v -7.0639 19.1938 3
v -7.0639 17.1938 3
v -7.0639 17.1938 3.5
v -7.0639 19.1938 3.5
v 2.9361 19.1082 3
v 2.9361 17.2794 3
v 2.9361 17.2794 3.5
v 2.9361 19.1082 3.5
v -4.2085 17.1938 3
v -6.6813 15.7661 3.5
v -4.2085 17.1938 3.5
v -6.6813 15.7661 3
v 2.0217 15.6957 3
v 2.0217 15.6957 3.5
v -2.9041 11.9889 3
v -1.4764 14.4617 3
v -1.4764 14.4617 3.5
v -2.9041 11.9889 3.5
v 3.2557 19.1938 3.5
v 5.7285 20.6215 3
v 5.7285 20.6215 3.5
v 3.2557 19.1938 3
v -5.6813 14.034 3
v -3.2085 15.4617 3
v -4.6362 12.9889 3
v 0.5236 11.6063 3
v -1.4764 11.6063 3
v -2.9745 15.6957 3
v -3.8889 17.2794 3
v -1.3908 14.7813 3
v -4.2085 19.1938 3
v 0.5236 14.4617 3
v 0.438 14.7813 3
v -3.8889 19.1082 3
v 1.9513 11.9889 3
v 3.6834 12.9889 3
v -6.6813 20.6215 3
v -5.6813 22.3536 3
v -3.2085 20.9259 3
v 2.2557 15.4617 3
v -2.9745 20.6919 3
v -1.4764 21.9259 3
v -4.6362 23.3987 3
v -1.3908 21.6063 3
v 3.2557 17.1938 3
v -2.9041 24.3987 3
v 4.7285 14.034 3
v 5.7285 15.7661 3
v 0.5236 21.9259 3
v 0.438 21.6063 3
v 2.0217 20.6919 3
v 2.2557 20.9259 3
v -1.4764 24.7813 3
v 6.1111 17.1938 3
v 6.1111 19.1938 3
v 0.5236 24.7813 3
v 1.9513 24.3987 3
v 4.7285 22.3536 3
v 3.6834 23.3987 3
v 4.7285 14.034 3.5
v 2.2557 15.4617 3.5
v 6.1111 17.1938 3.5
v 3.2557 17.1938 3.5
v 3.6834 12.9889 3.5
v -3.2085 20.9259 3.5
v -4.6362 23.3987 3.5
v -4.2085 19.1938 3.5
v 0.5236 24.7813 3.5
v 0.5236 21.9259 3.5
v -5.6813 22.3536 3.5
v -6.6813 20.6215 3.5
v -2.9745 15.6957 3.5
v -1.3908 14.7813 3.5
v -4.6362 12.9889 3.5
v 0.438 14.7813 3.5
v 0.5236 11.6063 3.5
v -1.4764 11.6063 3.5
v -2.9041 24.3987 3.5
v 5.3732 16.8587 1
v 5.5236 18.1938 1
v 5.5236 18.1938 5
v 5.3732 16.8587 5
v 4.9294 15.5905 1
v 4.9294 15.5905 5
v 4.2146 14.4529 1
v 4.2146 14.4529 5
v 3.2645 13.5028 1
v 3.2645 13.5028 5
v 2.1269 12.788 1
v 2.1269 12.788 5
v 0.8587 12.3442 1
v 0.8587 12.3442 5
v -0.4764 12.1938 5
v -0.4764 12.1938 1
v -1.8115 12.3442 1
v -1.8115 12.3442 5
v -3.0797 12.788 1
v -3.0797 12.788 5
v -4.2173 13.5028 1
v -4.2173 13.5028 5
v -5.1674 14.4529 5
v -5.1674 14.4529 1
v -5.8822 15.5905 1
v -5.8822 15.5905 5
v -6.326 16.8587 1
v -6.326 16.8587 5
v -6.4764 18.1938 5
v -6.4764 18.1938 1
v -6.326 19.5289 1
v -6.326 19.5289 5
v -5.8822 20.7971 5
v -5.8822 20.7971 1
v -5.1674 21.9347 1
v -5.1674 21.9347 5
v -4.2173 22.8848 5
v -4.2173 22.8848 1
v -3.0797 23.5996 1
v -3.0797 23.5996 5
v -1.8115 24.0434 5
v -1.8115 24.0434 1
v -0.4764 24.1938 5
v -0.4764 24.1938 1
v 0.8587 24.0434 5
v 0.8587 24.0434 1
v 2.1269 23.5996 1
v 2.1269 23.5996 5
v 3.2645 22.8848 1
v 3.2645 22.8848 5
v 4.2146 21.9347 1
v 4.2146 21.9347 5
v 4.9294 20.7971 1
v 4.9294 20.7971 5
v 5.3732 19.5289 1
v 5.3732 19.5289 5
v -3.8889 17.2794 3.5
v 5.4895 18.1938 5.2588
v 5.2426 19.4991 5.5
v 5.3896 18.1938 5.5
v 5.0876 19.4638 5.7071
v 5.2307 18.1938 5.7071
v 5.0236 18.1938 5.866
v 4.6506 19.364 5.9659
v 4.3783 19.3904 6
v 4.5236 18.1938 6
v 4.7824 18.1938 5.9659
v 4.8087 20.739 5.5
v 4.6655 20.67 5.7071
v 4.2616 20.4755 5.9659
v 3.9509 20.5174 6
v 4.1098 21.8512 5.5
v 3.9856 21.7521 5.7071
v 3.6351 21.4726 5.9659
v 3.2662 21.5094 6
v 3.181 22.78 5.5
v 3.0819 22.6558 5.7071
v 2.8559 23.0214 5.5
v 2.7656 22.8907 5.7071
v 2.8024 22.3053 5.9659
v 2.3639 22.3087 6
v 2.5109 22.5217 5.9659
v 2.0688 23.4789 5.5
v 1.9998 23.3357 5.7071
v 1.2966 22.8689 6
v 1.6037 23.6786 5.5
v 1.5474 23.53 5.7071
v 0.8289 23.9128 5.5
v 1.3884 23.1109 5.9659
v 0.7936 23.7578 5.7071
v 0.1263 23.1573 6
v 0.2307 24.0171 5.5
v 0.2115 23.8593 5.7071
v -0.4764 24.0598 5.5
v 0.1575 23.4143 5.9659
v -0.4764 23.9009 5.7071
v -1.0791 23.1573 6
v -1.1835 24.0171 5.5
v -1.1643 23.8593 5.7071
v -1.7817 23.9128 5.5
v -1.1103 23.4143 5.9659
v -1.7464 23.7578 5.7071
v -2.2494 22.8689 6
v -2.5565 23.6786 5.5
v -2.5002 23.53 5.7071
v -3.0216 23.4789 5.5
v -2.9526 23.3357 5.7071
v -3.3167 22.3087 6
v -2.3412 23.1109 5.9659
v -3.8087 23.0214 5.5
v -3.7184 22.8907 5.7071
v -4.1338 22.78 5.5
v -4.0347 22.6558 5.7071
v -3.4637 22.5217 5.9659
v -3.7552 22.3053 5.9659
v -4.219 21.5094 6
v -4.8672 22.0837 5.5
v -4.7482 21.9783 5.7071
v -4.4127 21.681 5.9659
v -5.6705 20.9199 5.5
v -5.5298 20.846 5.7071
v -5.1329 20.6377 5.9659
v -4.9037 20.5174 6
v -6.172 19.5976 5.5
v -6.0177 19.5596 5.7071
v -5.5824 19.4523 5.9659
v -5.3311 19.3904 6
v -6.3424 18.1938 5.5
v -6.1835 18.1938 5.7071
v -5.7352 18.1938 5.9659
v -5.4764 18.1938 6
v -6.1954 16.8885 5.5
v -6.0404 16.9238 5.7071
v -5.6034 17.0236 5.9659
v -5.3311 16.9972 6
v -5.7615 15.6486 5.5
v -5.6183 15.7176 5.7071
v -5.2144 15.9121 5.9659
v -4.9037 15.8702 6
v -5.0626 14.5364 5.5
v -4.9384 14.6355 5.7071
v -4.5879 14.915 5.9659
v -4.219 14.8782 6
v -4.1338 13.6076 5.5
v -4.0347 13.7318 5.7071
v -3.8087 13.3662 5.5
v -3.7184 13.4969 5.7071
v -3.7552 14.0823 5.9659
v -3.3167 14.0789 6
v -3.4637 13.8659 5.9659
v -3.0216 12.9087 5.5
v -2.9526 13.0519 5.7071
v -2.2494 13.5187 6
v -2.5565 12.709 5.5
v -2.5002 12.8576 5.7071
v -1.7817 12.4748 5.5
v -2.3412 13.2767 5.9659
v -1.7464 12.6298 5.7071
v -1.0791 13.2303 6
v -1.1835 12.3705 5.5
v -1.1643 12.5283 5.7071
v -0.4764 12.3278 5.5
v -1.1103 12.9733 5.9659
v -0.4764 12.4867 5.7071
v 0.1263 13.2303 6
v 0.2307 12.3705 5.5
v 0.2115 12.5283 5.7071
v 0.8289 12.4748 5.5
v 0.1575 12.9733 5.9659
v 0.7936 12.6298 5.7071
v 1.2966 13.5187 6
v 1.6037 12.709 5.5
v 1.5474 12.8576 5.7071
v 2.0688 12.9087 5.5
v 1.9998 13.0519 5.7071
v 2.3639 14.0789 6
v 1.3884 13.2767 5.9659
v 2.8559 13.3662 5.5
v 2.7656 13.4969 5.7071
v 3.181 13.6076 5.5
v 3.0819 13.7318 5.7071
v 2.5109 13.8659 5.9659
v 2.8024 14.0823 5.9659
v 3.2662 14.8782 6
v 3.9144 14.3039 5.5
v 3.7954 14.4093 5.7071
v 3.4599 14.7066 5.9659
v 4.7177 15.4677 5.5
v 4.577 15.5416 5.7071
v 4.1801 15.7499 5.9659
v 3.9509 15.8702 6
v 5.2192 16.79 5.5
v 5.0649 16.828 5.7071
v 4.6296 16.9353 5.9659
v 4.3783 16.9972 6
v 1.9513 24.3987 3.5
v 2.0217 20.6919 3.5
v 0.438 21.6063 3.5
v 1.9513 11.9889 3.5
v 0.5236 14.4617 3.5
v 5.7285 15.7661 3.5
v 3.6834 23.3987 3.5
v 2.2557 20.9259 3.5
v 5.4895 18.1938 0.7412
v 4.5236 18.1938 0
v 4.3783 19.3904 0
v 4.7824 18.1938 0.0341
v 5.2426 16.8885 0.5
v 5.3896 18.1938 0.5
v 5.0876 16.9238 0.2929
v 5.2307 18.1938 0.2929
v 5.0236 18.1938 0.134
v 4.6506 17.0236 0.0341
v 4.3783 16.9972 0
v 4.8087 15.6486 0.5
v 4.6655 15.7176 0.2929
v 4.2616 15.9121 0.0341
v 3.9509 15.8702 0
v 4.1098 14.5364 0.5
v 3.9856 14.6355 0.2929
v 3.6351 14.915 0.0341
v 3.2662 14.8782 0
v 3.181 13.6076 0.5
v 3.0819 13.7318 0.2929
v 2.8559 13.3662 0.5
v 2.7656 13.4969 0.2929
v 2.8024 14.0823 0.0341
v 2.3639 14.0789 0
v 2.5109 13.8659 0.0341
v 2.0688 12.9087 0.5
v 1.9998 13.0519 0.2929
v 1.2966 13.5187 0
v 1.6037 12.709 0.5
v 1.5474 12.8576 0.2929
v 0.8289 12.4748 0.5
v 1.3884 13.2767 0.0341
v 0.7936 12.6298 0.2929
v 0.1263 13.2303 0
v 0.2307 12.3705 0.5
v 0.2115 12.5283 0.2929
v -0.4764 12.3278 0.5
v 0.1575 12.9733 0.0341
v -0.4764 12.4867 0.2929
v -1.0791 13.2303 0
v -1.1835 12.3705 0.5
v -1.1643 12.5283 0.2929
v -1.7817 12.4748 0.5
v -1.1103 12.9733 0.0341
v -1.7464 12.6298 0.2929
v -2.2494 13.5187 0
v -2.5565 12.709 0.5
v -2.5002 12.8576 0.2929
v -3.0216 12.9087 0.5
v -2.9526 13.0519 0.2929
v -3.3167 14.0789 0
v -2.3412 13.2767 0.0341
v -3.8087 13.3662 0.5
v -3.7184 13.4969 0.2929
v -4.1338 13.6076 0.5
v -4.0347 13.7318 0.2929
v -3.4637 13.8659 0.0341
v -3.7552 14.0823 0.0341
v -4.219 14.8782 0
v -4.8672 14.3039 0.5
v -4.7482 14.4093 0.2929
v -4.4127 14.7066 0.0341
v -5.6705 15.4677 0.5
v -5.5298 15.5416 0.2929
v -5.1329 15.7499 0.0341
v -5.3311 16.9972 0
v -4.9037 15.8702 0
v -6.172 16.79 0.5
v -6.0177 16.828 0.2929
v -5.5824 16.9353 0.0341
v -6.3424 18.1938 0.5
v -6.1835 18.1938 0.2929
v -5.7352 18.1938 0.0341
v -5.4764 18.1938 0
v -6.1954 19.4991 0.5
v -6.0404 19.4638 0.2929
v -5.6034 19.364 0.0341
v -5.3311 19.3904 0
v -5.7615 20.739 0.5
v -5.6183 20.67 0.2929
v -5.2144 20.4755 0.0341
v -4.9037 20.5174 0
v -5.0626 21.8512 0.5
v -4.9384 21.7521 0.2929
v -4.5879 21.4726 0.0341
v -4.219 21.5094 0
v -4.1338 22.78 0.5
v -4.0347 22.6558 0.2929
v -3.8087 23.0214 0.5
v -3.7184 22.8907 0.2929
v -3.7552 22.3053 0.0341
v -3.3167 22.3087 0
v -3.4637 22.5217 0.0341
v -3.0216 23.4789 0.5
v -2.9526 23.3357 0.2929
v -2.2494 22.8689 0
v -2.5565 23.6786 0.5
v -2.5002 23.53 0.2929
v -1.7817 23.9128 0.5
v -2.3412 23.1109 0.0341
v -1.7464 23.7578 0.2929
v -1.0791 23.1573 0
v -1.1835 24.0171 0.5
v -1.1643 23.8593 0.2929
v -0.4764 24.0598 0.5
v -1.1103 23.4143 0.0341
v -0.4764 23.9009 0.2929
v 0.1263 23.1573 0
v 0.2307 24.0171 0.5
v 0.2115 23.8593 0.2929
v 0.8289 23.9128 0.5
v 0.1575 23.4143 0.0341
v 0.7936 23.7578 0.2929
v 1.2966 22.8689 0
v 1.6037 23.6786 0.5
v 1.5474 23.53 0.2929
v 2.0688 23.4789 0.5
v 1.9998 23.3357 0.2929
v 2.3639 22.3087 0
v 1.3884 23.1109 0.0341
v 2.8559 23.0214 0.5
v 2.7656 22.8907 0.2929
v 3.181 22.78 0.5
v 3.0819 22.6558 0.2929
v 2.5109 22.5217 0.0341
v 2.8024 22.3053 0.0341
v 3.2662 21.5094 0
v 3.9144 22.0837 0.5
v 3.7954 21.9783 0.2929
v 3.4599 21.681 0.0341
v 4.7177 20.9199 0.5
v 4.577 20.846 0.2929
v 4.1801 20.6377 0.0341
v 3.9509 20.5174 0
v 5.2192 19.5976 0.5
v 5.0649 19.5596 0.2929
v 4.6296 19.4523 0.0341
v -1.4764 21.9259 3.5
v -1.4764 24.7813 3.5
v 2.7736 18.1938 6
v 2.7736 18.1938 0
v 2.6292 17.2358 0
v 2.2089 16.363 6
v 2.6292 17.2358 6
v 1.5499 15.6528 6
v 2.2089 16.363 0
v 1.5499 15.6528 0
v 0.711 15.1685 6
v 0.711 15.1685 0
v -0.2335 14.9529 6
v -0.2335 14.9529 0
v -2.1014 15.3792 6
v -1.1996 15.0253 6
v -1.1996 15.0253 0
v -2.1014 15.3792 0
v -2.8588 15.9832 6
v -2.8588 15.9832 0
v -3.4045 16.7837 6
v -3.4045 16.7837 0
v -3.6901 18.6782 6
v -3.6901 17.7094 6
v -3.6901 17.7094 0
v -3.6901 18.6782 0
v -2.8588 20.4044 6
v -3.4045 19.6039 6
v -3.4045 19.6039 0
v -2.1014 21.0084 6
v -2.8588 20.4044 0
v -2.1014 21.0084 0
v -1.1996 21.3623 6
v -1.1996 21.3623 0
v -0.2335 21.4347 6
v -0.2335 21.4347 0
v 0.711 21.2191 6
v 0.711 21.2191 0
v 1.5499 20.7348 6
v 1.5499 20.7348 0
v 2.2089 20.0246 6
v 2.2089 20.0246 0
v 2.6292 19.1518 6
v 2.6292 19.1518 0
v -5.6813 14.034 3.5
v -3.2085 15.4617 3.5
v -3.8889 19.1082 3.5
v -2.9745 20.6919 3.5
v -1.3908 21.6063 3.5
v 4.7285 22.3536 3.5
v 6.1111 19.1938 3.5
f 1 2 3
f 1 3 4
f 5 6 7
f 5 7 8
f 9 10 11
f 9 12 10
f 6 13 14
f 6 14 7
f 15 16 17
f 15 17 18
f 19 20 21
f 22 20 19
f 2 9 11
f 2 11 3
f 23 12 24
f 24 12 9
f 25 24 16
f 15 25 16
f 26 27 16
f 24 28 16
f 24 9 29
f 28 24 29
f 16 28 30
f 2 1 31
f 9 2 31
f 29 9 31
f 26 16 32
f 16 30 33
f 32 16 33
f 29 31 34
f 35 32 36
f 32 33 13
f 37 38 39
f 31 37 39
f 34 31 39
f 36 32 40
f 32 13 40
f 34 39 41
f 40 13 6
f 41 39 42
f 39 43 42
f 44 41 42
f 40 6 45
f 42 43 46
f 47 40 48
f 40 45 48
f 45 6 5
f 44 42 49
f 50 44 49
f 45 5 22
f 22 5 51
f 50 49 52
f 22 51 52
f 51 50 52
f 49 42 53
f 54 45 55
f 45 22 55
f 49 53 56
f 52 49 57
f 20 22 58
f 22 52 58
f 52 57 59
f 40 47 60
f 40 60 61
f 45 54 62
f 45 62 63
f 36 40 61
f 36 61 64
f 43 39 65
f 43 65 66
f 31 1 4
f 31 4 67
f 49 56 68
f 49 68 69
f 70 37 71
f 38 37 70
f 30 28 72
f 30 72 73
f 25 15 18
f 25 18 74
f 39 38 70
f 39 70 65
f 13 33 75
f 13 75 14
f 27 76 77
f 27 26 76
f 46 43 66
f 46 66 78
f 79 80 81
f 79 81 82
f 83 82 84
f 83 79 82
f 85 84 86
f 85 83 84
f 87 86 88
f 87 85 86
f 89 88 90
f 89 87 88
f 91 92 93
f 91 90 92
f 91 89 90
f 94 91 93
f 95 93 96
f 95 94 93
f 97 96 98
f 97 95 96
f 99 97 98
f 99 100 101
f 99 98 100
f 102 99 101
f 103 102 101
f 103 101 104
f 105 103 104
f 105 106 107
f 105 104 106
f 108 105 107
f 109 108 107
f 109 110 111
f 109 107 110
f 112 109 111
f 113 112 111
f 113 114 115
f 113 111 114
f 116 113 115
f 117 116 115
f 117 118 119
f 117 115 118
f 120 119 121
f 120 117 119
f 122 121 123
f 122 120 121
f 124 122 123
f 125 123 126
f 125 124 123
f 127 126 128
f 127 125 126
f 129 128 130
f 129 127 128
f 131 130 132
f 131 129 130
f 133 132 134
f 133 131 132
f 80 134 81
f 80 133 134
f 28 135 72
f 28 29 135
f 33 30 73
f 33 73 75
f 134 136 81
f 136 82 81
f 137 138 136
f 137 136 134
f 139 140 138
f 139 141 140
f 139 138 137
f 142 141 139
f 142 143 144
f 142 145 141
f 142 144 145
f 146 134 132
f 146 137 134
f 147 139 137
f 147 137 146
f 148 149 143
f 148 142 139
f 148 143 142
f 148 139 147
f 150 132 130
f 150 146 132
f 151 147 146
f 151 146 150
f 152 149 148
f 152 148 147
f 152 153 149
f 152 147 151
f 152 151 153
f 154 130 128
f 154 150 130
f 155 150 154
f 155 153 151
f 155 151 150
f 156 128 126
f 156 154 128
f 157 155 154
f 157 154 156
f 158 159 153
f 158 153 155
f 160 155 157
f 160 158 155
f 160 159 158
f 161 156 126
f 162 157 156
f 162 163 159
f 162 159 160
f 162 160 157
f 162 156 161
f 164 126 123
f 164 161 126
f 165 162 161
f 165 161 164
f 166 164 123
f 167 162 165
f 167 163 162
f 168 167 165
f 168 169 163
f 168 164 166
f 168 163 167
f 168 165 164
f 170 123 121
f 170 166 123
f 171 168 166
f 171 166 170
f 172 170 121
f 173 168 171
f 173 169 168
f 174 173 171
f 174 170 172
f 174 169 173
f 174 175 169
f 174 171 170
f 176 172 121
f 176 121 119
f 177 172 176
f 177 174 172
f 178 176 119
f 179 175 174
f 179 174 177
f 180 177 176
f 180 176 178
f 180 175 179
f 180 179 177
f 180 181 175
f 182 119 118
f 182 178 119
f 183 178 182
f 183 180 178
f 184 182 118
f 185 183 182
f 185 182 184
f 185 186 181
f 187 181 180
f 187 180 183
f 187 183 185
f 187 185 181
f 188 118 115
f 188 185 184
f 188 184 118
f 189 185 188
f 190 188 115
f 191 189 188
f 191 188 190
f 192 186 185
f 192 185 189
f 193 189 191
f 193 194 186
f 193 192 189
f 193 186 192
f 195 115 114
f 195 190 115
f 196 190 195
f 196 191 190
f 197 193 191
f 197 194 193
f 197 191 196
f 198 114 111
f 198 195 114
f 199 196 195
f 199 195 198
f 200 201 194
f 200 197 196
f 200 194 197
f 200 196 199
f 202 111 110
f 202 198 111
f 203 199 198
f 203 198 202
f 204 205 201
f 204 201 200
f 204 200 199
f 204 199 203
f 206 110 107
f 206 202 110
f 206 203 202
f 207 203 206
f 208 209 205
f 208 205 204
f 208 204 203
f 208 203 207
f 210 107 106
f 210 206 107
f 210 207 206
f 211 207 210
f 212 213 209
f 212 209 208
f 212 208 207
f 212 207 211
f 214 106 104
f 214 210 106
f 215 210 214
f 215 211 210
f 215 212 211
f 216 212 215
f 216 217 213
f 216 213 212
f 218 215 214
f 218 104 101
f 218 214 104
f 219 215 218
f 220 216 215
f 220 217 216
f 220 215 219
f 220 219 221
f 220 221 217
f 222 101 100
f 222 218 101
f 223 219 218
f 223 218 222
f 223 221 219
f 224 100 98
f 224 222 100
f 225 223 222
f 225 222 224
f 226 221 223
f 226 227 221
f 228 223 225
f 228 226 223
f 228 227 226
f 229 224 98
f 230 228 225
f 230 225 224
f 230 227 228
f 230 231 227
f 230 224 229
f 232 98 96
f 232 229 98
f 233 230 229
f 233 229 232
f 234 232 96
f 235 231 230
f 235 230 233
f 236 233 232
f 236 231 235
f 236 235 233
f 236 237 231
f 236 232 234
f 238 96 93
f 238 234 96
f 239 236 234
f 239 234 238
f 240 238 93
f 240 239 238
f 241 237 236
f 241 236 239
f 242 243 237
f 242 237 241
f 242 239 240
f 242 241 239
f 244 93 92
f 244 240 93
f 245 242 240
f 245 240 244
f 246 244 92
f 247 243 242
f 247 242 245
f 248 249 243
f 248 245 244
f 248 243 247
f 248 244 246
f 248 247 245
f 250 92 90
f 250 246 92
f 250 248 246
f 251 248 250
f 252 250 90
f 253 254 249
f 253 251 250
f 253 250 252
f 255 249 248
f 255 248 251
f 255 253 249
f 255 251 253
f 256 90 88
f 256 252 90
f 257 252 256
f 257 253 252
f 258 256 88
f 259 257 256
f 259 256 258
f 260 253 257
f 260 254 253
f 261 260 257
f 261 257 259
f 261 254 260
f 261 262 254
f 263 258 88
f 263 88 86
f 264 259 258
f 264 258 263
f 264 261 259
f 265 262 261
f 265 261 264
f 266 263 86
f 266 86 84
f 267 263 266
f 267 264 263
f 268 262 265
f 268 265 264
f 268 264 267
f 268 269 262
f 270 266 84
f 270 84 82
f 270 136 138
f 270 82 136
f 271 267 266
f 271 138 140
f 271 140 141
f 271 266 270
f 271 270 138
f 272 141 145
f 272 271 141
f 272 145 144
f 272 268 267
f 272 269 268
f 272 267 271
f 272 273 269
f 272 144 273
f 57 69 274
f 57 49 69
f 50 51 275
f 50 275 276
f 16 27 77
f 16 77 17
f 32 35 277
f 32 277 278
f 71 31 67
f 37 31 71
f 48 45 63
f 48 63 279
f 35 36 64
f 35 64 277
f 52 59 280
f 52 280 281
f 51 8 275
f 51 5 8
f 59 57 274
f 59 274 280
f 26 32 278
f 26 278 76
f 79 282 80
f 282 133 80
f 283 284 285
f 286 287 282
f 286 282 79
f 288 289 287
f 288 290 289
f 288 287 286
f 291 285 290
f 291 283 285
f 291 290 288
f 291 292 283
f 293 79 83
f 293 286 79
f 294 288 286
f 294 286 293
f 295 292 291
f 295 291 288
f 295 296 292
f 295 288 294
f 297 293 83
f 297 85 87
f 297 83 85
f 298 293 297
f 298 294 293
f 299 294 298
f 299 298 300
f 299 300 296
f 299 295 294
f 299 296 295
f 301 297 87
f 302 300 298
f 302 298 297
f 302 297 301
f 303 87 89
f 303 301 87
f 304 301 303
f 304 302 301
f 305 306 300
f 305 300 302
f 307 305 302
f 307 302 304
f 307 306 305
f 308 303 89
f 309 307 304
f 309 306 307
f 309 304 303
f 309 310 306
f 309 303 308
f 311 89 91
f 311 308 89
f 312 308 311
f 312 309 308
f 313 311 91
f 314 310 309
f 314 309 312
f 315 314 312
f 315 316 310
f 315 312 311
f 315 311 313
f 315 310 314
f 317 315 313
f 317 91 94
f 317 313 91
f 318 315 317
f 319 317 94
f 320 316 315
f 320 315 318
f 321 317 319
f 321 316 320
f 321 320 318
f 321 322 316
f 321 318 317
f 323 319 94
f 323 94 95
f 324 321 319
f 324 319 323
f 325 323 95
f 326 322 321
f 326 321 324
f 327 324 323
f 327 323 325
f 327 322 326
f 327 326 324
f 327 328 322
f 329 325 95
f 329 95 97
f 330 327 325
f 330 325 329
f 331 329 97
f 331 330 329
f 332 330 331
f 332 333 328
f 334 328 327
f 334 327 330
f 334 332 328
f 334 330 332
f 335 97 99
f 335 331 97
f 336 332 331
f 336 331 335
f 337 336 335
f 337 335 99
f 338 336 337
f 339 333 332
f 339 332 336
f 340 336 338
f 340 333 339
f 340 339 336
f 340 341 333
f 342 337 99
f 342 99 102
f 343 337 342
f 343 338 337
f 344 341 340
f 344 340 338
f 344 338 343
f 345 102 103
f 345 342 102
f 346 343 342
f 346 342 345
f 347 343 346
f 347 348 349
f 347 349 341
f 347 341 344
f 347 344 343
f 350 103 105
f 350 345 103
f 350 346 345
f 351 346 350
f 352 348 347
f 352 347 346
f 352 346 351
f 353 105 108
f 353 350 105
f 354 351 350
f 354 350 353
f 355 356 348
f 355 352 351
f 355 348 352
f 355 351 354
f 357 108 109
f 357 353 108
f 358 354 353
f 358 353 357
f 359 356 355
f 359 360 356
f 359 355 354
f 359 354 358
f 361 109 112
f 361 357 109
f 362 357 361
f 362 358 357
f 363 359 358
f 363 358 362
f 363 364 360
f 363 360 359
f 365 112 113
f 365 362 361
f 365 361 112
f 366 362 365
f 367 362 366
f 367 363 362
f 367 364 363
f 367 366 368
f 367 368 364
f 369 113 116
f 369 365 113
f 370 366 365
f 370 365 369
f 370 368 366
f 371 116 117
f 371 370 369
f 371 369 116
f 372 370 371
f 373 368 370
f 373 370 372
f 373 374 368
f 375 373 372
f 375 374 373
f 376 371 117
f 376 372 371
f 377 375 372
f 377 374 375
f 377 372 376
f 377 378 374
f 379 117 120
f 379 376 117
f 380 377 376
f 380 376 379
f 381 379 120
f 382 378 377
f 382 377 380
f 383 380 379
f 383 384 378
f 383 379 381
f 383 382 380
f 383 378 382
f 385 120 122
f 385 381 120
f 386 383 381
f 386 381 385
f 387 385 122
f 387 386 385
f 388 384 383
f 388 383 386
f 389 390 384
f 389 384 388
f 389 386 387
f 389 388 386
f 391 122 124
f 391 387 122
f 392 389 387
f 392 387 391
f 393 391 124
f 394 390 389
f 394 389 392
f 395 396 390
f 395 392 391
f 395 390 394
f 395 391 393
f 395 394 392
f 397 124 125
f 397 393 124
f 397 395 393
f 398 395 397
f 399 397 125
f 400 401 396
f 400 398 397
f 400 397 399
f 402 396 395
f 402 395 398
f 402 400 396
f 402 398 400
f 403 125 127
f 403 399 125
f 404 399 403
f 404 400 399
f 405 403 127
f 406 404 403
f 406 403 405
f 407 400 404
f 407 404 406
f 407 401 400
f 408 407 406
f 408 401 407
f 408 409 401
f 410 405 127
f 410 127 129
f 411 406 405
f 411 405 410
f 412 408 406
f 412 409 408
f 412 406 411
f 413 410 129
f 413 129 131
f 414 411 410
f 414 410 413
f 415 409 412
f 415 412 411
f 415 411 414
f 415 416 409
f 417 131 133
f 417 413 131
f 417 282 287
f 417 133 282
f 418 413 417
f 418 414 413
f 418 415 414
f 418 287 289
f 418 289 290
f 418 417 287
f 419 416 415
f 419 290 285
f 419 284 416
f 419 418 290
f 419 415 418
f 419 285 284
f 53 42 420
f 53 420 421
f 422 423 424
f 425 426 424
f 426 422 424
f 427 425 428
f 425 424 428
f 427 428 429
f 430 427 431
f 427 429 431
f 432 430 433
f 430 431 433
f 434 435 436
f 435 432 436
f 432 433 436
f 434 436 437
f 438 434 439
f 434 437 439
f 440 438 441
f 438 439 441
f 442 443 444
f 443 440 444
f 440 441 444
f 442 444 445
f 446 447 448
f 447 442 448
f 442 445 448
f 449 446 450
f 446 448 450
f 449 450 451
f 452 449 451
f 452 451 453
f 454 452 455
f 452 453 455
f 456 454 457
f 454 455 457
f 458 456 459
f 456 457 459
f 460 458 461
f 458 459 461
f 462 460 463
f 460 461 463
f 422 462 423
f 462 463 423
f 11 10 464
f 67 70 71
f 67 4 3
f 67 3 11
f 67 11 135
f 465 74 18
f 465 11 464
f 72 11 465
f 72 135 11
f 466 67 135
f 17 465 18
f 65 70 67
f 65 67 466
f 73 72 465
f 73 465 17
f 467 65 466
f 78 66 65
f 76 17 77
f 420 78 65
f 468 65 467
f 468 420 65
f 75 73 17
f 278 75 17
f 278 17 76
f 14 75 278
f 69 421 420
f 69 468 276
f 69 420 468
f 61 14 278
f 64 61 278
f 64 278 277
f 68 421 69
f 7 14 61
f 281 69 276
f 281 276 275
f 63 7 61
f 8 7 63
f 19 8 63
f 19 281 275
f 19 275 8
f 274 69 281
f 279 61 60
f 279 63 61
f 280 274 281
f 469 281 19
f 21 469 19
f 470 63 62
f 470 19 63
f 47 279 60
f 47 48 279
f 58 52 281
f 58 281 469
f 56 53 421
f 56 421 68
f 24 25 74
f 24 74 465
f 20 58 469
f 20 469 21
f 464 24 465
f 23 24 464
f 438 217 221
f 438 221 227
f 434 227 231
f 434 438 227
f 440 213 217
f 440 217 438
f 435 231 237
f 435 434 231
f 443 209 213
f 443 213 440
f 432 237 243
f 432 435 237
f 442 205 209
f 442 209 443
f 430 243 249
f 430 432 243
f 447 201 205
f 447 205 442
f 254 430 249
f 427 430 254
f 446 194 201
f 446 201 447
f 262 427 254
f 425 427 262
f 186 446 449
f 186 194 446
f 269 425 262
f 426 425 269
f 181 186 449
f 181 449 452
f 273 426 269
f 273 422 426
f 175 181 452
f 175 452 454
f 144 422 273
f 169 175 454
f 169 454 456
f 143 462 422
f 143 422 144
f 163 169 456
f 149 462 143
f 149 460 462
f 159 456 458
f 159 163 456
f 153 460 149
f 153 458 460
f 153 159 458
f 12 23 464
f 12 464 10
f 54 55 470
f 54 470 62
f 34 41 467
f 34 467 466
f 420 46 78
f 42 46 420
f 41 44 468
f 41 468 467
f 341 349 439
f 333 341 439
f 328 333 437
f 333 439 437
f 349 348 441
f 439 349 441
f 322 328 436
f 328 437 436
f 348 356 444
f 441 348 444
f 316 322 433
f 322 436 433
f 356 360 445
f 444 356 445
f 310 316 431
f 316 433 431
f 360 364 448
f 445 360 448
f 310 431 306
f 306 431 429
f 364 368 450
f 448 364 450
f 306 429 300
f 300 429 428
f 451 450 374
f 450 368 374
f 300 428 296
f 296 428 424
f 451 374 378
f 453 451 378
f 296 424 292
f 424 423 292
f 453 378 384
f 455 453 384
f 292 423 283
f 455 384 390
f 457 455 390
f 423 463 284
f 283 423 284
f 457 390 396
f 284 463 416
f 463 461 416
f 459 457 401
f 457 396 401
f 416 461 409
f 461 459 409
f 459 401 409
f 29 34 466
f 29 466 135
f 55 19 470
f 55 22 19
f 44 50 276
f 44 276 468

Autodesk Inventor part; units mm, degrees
ref_plane "YZ Plane" through (0, 0, 0) normal (1, 0, 0) x (0, 1, 0)
ref_plane "XZ Plane" through (0, 0, 0) normal (0, 1, 0) x (-1, 0, 0)
ref_plane "XY Plane" through (0, 0, 0) normal (0, 0, 1) x (1, 0, 0)
ref_plane "Work Plane1" through (0, 0, 0) normal (0, 0, 1) x (1, 0, 0)
ref_plane "Work Plane2" through (0, 0, 0) normal (0, 0, 1) x (1, 0, 0)
sketch "Sketch1" plane through (0, 0, 0) normal (0, 0, 1) x (1, 0, 0)
  circle A0 centre (-0.4764, 18.1938) radius 8.3 projected
  circle A1 centre (-0.4764, 18.1938) radius 6 projected
  circle A2 centre (-0.4764, 18.1938) radius 3.25
  point P0 (0, 0)
  dimension "d0" = 6.5
extrude "Extrusion1" add sketch "Sketch1" along normal blind 6 contours A1
fillet "Fillet1" radius 1 2 edges at (-6.4764, 18.1938, 6) (-6.4764, 18.1938, 0)
ref_plane "Work Plane3" through (-0.4764, 18.1938, 3) normal (0, 0, 1) x (1, 0, 0)
sketch "Sketch2" plane through (-0.4764, 18.1938, 3) normal (0, 0, 1) x (1, 0, 0)
  line L0 (1, 3.4125) -> (-1, 3.4125)
  line L1 (-1, 3.4125) -> (-1, 6.5875)
  line L2 (-1, 6.5875) -> (1, 6.5875)
  line L3 (1, 6.5875) -> (1, 3.4125)
  line L4 (1, 3.4125) -> (-1, 6.5875) construction
  line L5 (-1, 3.4125) -> (1, 6.5875) construction
  circle A0 centre (0, 0) radius 3.25 projected
  point P0 (0.4764, -18.1938)
  point P1 (0, 5)
  dimension "d5" = 2
  dimension "d6" = 5
extrude "Extrusion2" add sketch "Sketch2" along normal blind 0.5 separate body contours L0 L1 L2 L3
pattern_circular "Circular Pattern1" count 12 over 360 about axis through (-0.4764, 18.1938, 0) along (0, 0, 1) of "Extrusion2" bodies 2
properties part number "tube clamp"
